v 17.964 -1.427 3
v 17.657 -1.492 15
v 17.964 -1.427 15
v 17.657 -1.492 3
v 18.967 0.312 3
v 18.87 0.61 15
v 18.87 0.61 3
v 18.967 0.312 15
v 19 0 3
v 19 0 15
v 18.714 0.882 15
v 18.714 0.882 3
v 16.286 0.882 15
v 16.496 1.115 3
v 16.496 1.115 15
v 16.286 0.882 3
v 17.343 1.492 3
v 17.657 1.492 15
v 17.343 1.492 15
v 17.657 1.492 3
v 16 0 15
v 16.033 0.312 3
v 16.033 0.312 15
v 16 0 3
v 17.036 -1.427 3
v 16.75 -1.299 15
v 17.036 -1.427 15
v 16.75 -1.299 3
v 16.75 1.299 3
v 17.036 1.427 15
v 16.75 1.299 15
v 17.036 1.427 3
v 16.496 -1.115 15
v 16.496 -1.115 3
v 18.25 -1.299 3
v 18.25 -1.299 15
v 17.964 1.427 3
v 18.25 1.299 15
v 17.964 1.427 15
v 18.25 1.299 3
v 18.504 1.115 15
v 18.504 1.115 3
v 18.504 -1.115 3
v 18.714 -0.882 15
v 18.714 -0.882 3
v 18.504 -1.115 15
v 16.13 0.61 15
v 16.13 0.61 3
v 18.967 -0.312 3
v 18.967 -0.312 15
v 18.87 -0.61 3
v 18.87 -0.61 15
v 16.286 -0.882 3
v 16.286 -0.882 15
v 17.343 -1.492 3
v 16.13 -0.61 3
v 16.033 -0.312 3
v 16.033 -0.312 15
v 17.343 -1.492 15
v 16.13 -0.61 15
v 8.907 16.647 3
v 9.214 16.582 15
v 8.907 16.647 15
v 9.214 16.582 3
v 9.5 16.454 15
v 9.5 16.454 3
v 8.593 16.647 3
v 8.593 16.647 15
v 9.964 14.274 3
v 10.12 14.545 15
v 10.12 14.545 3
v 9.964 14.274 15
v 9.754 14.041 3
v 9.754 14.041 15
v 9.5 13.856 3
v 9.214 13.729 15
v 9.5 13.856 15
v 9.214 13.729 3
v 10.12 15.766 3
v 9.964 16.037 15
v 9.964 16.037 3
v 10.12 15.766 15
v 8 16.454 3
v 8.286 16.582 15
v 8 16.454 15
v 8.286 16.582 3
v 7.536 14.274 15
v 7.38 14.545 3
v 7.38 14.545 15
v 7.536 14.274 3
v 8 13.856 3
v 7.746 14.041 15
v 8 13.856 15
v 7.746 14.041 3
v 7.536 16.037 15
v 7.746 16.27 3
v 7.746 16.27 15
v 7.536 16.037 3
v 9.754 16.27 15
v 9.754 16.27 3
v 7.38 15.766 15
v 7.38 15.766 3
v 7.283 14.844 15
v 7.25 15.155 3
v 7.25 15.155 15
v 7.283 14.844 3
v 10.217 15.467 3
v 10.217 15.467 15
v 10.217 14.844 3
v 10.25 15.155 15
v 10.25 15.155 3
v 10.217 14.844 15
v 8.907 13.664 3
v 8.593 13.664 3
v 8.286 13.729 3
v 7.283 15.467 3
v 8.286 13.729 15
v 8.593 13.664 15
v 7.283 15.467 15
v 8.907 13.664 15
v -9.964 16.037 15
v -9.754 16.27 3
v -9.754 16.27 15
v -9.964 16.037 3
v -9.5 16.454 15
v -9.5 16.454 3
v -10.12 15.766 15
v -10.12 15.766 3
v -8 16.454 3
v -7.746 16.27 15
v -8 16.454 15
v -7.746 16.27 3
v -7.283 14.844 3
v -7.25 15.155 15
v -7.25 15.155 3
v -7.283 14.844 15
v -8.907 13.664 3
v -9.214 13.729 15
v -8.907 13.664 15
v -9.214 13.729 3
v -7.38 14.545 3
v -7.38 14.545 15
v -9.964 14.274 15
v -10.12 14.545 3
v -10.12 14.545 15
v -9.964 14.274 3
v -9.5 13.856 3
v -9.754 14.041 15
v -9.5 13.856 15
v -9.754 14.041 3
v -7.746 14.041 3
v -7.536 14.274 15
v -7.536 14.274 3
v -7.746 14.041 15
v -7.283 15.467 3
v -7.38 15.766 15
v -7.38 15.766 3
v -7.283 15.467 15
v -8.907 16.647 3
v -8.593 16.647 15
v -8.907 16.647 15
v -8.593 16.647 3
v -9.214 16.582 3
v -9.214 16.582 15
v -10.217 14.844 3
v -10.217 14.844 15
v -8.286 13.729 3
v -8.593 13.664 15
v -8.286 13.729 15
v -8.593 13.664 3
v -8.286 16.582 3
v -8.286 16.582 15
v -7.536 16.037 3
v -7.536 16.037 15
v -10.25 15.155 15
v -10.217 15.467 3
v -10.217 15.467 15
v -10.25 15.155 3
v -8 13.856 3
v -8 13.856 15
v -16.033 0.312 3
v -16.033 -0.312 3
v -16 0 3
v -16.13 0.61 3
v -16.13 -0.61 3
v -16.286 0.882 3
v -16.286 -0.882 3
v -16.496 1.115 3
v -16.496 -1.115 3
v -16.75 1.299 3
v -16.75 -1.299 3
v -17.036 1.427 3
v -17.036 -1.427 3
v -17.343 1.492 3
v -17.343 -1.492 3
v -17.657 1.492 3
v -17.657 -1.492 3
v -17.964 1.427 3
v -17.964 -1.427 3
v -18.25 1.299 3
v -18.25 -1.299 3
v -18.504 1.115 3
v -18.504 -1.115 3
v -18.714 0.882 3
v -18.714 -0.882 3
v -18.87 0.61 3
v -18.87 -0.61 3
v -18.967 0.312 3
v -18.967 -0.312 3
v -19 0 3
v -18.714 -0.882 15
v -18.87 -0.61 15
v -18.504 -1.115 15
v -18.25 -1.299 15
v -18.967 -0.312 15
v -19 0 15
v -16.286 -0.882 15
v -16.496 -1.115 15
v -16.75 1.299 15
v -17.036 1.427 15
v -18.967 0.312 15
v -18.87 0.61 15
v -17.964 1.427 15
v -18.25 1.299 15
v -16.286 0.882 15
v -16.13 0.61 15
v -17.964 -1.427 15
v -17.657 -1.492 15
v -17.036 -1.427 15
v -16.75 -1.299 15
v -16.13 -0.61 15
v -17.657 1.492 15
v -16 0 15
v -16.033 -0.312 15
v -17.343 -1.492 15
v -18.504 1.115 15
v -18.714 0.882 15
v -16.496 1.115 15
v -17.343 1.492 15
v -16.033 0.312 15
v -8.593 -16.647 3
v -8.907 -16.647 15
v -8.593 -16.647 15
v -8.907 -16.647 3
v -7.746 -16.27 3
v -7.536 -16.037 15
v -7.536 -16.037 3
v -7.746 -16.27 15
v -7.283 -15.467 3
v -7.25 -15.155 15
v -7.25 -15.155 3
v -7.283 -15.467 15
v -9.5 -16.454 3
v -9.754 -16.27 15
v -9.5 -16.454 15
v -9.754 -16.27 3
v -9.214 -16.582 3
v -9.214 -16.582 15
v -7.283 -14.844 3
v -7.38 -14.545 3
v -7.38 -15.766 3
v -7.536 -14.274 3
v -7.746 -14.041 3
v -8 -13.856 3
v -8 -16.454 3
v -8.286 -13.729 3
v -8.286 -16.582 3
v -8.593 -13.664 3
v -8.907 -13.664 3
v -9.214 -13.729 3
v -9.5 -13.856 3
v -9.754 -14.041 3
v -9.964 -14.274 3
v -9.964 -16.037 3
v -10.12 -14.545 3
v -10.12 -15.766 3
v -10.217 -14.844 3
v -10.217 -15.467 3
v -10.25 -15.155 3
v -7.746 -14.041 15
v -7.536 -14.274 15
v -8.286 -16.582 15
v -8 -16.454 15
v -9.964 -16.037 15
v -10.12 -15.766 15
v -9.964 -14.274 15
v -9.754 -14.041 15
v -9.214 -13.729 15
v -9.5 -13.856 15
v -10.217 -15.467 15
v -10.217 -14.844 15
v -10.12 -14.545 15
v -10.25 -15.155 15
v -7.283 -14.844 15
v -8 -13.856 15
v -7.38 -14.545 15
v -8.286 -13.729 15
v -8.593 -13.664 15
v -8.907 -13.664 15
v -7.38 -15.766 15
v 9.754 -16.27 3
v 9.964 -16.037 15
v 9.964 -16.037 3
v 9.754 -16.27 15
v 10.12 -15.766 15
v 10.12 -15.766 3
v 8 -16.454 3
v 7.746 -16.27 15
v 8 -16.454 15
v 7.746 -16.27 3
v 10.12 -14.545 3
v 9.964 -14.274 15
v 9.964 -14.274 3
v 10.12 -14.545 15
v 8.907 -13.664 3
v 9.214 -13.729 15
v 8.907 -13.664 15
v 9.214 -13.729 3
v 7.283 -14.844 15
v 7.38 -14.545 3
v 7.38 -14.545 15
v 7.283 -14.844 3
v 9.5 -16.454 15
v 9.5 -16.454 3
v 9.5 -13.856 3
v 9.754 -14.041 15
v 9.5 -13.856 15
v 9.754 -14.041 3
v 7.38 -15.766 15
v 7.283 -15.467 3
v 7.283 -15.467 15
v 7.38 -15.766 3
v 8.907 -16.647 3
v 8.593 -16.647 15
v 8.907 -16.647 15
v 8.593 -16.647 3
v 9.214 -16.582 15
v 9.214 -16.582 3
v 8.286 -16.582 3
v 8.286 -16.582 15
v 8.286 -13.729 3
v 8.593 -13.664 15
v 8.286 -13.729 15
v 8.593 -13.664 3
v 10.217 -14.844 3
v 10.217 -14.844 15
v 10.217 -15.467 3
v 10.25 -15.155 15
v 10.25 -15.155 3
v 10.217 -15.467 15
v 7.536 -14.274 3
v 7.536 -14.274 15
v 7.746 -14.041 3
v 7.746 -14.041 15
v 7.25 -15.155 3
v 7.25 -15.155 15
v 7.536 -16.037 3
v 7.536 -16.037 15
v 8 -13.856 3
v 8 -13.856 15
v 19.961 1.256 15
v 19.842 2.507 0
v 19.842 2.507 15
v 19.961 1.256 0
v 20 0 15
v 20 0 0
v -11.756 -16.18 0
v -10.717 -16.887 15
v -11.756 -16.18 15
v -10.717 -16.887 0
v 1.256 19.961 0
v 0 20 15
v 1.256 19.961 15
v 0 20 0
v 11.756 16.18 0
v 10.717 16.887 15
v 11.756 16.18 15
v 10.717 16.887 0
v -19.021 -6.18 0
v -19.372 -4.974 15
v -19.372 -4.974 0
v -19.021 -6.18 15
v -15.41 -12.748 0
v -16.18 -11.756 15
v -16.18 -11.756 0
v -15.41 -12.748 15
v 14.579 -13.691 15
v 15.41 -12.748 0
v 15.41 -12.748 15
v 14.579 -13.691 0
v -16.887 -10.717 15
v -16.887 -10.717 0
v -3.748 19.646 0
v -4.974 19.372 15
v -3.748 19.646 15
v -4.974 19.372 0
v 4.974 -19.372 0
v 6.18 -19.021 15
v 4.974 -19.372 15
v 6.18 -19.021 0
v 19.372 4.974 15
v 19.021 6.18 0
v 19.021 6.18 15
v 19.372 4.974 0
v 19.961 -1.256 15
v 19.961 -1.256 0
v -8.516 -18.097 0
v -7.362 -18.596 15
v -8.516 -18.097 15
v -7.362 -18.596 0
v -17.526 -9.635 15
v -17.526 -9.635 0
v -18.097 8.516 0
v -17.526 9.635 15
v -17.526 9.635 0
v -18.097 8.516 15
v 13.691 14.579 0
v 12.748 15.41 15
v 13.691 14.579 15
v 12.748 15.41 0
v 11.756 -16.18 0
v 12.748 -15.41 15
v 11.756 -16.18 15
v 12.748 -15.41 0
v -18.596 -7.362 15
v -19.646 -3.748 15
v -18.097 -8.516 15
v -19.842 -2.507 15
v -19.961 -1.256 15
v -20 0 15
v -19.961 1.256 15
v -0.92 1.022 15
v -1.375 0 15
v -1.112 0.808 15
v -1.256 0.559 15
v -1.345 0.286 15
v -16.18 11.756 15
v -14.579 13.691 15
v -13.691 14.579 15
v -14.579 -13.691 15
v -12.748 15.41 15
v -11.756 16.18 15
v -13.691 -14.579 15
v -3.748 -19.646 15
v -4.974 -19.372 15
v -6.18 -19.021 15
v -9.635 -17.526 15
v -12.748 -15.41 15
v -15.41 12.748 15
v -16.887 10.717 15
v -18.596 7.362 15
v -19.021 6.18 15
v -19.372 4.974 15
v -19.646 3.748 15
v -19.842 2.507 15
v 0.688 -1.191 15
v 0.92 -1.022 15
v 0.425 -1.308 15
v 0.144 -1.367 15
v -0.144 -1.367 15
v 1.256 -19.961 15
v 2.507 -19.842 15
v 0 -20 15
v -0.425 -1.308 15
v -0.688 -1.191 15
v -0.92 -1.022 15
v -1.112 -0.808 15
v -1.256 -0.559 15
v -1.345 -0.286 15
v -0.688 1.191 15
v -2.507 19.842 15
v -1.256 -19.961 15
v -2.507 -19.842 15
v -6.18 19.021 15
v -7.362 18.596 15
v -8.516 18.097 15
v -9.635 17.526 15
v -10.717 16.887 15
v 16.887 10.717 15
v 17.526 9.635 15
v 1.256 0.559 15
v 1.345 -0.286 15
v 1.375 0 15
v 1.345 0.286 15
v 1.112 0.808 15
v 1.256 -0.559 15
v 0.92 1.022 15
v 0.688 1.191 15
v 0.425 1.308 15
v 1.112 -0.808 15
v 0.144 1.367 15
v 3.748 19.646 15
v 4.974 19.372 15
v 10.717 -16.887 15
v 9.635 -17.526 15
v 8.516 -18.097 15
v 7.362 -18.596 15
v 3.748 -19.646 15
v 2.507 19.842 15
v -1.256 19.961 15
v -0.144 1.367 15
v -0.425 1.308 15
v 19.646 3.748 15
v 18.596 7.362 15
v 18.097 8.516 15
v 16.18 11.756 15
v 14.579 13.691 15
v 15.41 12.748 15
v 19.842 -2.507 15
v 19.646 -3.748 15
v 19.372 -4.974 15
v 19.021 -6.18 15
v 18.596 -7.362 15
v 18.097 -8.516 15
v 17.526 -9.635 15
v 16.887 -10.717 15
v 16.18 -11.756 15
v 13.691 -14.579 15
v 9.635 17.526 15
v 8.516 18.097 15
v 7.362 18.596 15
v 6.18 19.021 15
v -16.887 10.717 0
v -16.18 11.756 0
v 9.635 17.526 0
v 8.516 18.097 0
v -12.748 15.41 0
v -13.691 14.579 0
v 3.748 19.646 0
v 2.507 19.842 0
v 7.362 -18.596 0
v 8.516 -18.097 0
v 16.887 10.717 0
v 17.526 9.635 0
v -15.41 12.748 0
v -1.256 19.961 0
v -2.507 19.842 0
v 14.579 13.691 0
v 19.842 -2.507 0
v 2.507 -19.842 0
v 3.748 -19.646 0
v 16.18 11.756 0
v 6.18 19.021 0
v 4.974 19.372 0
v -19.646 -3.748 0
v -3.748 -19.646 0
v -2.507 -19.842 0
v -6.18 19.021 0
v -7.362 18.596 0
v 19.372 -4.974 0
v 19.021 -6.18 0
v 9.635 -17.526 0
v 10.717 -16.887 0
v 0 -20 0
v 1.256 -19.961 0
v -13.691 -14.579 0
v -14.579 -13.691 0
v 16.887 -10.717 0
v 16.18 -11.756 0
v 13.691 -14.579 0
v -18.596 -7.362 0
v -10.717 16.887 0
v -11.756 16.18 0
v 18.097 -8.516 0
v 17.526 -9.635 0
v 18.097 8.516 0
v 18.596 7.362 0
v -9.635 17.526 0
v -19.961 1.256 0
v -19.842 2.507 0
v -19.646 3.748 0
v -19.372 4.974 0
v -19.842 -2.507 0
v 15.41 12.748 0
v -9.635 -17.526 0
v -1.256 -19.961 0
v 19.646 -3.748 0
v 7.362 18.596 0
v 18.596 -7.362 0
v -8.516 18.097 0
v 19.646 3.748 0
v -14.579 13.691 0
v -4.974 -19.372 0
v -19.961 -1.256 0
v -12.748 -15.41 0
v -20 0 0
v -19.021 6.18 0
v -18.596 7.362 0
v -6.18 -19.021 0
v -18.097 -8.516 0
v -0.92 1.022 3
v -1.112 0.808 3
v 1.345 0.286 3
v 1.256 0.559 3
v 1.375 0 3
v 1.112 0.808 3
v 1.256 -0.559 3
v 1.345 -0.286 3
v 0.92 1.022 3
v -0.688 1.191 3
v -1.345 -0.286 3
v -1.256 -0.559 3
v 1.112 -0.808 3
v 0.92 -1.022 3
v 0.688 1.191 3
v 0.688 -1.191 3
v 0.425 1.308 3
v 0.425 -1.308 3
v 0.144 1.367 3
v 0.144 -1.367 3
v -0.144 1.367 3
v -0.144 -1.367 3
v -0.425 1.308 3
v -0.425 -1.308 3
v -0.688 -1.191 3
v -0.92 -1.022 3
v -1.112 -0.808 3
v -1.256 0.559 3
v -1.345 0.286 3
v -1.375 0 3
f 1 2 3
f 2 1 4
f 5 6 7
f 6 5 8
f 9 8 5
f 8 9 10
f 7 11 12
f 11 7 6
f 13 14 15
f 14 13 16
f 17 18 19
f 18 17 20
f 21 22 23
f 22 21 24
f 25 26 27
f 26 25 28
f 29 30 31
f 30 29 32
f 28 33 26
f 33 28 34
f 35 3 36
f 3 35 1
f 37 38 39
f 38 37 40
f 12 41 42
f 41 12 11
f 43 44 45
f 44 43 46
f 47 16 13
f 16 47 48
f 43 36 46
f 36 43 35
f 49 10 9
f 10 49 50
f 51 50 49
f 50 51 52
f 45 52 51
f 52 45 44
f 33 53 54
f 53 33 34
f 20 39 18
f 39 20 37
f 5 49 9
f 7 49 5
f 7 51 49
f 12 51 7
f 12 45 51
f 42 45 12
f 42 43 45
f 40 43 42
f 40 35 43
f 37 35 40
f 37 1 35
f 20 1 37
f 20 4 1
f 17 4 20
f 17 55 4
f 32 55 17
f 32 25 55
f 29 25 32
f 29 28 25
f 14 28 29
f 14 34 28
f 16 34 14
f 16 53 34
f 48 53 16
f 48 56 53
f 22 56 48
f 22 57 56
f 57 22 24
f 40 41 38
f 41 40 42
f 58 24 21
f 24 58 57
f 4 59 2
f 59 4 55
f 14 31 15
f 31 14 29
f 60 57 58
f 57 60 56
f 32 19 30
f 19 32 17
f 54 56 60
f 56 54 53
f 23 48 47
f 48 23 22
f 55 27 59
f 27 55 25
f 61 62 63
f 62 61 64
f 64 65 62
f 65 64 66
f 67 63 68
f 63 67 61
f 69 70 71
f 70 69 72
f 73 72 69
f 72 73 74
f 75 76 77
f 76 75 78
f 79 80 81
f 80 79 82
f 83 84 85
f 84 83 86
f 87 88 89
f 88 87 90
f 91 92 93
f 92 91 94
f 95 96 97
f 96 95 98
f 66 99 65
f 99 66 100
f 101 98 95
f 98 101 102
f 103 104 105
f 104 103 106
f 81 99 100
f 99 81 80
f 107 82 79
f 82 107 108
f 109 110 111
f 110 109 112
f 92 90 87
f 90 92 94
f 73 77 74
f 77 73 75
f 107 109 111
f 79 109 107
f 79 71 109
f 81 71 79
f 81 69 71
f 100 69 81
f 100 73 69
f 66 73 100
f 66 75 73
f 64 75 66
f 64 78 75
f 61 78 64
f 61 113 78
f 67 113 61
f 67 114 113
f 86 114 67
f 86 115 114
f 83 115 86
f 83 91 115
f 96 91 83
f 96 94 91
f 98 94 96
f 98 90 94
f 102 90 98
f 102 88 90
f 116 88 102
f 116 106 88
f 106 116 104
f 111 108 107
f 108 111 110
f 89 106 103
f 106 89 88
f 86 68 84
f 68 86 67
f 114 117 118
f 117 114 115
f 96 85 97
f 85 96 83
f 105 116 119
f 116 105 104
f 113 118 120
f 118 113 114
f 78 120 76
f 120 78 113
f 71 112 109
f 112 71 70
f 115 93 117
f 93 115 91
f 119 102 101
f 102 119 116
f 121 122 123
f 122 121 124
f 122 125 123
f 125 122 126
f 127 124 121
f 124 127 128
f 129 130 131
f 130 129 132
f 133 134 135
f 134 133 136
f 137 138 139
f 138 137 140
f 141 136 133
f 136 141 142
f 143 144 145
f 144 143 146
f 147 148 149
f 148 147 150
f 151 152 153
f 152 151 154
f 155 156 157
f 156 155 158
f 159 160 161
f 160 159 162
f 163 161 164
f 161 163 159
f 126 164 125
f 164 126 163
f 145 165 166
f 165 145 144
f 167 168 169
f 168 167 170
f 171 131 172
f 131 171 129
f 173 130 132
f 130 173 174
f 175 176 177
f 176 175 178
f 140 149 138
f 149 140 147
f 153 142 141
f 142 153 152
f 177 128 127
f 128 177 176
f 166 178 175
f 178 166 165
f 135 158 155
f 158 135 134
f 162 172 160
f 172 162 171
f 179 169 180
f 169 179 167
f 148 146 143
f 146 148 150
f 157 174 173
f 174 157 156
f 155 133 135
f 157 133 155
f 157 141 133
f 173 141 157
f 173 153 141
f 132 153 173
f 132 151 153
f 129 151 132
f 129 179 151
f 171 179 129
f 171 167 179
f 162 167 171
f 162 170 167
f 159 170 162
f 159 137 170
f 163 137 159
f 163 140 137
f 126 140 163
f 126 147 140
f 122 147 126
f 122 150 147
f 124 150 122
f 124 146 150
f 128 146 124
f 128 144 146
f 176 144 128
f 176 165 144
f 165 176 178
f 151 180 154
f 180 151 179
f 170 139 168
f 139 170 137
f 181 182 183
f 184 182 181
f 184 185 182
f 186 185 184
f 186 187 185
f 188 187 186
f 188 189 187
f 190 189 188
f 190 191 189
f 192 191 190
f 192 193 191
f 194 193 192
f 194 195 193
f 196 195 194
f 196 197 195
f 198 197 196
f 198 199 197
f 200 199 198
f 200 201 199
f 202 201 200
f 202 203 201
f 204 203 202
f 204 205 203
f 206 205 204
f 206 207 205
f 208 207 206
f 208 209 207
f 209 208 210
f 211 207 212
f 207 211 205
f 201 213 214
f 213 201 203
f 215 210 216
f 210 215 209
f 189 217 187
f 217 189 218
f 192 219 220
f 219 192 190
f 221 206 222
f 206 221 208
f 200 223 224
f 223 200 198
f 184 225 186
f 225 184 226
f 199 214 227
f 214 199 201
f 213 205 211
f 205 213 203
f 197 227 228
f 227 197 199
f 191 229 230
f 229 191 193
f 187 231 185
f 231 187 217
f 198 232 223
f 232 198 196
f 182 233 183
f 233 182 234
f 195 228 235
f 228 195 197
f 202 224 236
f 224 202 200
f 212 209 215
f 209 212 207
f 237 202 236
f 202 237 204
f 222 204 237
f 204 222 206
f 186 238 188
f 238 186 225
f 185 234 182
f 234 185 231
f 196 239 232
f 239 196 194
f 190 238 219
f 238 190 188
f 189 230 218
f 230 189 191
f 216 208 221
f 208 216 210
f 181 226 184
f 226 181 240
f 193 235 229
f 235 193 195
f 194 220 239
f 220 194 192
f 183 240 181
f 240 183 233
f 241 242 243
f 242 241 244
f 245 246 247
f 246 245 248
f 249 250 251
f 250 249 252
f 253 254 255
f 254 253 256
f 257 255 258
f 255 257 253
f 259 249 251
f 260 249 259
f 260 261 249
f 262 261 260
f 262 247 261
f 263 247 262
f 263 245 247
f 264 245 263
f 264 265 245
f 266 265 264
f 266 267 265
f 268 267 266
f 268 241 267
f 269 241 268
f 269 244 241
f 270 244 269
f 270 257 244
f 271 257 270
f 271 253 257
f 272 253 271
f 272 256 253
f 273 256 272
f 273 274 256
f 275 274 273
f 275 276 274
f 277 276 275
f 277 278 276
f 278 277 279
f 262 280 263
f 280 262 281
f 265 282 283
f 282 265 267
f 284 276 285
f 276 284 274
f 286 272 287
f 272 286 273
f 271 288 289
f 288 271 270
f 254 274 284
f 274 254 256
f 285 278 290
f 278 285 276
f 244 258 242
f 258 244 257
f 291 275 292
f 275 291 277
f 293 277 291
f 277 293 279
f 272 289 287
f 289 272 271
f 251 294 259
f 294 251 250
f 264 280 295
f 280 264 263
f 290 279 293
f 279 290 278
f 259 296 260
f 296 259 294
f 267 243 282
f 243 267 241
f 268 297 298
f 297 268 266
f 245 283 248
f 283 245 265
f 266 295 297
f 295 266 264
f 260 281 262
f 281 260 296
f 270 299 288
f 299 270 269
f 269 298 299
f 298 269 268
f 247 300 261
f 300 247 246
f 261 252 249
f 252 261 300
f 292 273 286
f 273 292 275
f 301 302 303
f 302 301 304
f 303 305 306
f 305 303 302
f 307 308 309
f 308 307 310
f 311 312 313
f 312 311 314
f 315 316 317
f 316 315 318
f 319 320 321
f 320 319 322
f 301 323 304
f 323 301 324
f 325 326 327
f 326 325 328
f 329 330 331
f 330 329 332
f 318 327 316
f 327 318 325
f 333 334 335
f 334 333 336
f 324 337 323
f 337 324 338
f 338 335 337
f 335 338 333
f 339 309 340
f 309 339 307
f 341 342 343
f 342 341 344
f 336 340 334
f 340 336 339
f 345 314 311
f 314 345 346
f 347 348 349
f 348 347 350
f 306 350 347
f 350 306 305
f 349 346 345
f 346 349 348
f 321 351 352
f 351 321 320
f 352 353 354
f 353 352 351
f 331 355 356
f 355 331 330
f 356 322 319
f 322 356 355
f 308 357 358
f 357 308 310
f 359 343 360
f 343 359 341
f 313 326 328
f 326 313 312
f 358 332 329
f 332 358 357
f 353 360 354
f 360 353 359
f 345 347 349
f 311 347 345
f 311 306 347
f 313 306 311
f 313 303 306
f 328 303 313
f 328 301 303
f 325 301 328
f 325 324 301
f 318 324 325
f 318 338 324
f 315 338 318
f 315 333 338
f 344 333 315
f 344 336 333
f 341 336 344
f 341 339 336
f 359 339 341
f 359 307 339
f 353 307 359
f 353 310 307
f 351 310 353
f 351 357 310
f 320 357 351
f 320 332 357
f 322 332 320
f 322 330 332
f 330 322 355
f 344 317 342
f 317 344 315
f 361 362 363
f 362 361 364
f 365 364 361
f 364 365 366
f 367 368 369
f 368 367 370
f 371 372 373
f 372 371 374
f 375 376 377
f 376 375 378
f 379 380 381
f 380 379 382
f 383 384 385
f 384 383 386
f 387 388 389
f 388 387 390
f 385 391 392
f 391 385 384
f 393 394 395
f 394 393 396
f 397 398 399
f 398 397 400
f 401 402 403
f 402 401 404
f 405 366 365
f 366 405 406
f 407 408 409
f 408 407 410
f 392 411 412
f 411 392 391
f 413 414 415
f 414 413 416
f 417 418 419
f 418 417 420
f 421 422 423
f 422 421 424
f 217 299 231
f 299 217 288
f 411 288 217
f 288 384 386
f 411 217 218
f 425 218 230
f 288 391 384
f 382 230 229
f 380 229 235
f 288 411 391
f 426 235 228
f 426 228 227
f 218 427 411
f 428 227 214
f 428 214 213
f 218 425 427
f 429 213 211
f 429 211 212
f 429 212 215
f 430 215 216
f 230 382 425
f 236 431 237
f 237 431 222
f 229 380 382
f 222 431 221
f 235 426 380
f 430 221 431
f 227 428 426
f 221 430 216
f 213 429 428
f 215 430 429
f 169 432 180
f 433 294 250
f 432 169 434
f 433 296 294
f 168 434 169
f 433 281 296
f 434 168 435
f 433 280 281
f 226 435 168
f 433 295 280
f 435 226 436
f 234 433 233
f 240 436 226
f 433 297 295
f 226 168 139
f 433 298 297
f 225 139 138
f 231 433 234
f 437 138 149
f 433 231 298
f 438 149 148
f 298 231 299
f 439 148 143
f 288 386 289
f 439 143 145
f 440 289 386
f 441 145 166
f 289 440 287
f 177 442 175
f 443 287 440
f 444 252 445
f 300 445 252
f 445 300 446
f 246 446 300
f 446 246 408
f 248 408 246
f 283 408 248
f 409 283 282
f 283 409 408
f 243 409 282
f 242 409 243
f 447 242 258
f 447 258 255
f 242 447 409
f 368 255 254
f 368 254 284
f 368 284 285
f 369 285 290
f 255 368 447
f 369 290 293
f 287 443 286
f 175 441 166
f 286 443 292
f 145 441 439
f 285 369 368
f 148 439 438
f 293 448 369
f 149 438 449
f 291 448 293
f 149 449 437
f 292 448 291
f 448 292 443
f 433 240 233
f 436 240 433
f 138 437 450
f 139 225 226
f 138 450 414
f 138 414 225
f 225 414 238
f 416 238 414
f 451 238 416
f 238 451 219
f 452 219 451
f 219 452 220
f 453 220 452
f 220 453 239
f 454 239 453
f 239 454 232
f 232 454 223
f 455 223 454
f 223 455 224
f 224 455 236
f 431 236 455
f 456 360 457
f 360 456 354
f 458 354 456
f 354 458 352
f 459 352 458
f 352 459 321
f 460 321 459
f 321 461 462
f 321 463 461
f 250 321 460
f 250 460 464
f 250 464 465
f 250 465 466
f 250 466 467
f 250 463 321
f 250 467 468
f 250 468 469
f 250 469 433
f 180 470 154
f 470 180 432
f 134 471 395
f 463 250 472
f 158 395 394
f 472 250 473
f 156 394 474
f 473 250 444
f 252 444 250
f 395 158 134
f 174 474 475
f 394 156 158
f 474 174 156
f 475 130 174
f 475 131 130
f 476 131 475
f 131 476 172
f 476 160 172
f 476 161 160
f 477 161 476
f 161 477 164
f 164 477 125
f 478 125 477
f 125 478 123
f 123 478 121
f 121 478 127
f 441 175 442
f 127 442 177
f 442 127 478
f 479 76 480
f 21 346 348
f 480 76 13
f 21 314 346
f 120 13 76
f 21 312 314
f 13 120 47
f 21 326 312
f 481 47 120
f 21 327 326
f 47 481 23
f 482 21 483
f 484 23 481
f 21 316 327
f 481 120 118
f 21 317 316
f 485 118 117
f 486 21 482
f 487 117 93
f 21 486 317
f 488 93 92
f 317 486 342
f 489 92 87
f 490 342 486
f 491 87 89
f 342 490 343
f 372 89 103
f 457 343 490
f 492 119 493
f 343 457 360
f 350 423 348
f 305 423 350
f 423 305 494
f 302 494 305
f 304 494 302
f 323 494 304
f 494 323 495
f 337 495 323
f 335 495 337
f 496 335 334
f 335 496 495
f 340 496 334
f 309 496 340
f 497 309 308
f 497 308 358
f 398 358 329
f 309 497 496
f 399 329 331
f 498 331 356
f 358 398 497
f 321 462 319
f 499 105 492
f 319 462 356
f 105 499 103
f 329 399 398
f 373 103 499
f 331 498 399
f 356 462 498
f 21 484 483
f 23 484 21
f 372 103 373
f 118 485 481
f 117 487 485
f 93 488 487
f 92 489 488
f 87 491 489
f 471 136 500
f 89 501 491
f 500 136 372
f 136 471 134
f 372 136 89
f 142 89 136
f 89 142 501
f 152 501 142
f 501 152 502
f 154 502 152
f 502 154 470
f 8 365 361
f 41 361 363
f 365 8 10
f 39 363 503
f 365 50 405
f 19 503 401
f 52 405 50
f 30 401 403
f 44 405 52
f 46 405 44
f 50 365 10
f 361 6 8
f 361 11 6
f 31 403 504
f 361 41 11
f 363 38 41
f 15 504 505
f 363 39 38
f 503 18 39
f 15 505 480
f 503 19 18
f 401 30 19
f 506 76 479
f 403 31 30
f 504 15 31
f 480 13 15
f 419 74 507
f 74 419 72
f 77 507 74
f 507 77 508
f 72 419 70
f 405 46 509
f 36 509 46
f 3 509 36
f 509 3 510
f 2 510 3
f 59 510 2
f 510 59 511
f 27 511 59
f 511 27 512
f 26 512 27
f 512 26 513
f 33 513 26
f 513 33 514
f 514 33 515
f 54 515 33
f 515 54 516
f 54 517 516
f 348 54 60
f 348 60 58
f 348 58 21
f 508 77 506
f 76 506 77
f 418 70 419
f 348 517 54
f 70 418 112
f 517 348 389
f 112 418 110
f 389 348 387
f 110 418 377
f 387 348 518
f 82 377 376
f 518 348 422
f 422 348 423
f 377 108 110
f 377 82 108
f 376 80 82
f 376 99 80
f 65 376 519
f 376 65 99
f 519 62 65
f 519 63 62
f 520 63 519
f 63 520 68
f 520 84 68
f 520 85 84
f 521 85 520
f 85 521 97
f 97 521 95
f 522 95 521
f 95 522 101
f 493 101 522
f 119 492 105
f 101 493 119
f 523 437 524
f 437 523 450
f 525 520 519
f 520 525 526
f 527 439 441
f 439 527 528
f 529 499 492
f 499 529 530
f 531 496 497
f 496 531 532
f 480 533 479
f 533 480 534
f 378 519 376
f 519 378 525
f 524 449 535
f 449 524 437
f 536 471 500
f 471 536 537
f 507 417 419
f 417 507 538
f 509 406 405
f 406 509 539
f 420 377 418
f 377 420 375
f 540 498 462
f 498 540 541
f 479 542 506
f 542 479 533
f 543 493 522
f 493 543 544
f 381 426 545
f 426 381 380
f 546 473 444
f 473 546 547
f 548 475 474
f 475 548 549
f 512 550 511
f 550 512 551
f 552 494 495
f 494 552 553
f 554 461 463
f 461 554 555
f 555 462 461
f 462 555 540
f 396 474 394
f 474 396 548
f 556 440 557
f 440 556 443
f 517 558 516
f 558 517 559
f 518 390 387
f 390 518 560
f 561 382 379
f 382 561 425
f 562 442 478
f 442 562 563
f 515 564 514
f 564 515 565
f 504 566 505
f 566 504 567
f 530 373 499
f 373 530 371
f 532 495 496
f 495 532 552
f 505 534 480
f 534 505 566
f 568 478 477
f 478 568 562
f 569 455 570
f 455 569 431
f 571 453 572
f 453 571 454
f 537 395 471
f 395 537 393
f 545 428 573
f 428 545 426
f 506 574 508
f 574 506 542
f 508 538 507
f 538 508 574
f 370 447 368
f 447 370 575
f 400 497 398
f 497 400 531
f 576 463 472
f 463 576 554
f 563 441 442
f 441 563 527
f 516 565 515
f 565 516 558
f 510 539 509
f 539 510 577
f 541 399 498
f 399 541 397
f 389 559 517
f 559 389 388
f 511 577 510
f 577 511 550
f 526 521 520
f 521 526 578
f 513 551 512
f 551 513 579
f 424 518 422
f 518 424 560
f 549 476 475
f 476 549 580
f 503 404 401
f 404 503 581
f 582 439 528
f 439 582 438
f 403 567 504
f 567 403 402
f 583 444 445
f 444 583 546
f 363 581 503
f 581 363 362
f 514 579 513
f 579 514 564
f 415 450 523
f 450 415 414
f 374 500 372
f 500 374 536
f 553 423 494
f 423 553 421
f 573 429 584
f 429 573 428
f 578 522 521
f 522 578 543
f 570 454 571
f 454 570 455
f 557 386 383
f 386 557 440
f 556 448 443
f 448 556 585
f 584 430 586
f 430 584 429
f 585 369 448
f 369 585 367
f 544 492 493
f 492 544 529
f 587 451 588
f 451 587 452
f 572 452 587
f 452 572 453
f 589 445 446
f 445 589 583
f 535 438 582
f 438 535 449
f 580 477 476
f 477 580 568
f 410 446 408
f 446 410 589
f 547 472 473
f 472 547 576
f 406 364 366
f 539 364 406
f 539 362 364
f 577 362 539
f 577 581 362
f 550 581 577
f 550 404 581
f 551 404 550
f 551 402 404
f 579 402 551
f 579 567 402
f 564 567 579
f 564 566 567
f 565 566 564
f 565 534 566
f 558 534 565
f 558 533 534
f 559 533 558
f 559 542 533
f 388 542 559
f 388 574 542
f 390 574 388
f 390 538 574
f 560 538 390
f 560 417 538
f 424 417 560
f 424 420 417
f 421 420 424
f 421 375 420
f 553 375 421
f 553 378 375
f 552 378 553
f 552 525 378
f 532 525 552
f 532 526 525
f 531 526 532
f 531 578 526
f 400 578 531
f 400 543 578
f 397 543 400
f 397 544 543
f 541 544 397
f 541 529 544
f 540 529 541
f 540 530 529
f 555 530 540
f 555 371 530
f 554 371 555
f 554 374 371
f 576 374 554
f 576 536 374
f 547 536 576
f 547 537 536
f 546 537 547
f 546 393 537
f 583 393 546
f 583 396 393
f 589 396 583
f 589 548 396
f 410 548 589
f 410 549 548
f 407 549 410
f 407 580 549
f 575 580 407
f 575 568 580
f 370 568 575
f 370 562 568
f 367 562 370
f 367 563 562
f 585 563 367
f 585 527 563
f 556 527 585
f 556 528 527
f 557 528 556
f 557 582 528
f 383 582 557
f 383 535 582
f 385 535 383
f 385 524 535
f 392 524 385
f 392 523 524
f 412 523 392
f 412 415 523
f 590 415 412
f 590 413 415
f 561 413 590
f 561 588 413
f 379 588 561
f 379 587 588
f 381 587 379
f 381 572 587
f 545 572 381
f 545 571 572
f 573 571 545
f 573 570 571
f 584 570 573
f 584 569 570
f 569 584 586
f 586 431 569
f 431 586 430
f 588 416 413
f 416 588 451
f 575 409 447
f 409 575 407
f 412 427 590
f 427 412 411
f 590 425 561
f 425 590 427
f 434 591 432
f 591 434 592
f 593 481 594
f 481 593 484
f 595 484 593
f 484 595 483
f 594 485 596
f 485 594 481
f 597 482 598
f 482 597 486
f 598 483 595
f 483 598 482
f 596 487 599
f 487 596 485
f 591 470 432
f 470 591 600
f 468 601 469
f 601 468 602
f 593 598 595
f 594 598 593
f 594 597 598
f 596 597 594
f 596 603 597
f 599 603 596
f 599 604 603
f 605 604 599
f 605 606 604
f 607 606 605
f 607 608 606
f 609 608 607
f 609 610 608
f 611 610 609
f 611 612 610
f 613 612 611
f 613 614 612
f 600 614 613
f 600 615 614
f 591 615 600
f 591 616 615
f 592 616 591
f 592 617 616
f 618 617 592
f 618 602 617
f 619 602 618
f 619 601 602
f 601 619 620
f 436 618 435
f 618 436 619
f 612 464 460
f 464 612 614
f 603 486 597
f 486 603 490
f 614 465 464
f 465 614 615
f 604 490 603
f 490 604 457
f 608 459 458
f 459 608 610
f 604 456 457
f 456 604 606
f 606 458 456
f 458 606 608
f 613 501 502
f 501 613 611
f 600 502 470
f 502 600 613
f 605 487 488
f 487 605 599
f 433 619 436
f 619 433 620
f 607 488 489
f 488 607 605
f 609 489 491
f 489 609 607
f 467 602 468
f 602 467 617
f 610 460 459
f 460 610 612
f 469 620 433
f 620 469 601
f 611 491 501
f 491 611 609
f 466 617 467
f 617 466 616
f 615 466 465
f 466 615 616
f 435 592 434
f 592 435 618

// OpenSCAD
difference() {
  cylinder(h=15, r=20, $fn=100);
  for (a=[0:5]) rotate([0, 0, a*360/6]) translate([17.5, 0, 3]) cylinder(h=13, d=3, $fn=30);
  translate([0, 0, 3]) cylinder(h=13, d=2.75, $fn=30);
}
